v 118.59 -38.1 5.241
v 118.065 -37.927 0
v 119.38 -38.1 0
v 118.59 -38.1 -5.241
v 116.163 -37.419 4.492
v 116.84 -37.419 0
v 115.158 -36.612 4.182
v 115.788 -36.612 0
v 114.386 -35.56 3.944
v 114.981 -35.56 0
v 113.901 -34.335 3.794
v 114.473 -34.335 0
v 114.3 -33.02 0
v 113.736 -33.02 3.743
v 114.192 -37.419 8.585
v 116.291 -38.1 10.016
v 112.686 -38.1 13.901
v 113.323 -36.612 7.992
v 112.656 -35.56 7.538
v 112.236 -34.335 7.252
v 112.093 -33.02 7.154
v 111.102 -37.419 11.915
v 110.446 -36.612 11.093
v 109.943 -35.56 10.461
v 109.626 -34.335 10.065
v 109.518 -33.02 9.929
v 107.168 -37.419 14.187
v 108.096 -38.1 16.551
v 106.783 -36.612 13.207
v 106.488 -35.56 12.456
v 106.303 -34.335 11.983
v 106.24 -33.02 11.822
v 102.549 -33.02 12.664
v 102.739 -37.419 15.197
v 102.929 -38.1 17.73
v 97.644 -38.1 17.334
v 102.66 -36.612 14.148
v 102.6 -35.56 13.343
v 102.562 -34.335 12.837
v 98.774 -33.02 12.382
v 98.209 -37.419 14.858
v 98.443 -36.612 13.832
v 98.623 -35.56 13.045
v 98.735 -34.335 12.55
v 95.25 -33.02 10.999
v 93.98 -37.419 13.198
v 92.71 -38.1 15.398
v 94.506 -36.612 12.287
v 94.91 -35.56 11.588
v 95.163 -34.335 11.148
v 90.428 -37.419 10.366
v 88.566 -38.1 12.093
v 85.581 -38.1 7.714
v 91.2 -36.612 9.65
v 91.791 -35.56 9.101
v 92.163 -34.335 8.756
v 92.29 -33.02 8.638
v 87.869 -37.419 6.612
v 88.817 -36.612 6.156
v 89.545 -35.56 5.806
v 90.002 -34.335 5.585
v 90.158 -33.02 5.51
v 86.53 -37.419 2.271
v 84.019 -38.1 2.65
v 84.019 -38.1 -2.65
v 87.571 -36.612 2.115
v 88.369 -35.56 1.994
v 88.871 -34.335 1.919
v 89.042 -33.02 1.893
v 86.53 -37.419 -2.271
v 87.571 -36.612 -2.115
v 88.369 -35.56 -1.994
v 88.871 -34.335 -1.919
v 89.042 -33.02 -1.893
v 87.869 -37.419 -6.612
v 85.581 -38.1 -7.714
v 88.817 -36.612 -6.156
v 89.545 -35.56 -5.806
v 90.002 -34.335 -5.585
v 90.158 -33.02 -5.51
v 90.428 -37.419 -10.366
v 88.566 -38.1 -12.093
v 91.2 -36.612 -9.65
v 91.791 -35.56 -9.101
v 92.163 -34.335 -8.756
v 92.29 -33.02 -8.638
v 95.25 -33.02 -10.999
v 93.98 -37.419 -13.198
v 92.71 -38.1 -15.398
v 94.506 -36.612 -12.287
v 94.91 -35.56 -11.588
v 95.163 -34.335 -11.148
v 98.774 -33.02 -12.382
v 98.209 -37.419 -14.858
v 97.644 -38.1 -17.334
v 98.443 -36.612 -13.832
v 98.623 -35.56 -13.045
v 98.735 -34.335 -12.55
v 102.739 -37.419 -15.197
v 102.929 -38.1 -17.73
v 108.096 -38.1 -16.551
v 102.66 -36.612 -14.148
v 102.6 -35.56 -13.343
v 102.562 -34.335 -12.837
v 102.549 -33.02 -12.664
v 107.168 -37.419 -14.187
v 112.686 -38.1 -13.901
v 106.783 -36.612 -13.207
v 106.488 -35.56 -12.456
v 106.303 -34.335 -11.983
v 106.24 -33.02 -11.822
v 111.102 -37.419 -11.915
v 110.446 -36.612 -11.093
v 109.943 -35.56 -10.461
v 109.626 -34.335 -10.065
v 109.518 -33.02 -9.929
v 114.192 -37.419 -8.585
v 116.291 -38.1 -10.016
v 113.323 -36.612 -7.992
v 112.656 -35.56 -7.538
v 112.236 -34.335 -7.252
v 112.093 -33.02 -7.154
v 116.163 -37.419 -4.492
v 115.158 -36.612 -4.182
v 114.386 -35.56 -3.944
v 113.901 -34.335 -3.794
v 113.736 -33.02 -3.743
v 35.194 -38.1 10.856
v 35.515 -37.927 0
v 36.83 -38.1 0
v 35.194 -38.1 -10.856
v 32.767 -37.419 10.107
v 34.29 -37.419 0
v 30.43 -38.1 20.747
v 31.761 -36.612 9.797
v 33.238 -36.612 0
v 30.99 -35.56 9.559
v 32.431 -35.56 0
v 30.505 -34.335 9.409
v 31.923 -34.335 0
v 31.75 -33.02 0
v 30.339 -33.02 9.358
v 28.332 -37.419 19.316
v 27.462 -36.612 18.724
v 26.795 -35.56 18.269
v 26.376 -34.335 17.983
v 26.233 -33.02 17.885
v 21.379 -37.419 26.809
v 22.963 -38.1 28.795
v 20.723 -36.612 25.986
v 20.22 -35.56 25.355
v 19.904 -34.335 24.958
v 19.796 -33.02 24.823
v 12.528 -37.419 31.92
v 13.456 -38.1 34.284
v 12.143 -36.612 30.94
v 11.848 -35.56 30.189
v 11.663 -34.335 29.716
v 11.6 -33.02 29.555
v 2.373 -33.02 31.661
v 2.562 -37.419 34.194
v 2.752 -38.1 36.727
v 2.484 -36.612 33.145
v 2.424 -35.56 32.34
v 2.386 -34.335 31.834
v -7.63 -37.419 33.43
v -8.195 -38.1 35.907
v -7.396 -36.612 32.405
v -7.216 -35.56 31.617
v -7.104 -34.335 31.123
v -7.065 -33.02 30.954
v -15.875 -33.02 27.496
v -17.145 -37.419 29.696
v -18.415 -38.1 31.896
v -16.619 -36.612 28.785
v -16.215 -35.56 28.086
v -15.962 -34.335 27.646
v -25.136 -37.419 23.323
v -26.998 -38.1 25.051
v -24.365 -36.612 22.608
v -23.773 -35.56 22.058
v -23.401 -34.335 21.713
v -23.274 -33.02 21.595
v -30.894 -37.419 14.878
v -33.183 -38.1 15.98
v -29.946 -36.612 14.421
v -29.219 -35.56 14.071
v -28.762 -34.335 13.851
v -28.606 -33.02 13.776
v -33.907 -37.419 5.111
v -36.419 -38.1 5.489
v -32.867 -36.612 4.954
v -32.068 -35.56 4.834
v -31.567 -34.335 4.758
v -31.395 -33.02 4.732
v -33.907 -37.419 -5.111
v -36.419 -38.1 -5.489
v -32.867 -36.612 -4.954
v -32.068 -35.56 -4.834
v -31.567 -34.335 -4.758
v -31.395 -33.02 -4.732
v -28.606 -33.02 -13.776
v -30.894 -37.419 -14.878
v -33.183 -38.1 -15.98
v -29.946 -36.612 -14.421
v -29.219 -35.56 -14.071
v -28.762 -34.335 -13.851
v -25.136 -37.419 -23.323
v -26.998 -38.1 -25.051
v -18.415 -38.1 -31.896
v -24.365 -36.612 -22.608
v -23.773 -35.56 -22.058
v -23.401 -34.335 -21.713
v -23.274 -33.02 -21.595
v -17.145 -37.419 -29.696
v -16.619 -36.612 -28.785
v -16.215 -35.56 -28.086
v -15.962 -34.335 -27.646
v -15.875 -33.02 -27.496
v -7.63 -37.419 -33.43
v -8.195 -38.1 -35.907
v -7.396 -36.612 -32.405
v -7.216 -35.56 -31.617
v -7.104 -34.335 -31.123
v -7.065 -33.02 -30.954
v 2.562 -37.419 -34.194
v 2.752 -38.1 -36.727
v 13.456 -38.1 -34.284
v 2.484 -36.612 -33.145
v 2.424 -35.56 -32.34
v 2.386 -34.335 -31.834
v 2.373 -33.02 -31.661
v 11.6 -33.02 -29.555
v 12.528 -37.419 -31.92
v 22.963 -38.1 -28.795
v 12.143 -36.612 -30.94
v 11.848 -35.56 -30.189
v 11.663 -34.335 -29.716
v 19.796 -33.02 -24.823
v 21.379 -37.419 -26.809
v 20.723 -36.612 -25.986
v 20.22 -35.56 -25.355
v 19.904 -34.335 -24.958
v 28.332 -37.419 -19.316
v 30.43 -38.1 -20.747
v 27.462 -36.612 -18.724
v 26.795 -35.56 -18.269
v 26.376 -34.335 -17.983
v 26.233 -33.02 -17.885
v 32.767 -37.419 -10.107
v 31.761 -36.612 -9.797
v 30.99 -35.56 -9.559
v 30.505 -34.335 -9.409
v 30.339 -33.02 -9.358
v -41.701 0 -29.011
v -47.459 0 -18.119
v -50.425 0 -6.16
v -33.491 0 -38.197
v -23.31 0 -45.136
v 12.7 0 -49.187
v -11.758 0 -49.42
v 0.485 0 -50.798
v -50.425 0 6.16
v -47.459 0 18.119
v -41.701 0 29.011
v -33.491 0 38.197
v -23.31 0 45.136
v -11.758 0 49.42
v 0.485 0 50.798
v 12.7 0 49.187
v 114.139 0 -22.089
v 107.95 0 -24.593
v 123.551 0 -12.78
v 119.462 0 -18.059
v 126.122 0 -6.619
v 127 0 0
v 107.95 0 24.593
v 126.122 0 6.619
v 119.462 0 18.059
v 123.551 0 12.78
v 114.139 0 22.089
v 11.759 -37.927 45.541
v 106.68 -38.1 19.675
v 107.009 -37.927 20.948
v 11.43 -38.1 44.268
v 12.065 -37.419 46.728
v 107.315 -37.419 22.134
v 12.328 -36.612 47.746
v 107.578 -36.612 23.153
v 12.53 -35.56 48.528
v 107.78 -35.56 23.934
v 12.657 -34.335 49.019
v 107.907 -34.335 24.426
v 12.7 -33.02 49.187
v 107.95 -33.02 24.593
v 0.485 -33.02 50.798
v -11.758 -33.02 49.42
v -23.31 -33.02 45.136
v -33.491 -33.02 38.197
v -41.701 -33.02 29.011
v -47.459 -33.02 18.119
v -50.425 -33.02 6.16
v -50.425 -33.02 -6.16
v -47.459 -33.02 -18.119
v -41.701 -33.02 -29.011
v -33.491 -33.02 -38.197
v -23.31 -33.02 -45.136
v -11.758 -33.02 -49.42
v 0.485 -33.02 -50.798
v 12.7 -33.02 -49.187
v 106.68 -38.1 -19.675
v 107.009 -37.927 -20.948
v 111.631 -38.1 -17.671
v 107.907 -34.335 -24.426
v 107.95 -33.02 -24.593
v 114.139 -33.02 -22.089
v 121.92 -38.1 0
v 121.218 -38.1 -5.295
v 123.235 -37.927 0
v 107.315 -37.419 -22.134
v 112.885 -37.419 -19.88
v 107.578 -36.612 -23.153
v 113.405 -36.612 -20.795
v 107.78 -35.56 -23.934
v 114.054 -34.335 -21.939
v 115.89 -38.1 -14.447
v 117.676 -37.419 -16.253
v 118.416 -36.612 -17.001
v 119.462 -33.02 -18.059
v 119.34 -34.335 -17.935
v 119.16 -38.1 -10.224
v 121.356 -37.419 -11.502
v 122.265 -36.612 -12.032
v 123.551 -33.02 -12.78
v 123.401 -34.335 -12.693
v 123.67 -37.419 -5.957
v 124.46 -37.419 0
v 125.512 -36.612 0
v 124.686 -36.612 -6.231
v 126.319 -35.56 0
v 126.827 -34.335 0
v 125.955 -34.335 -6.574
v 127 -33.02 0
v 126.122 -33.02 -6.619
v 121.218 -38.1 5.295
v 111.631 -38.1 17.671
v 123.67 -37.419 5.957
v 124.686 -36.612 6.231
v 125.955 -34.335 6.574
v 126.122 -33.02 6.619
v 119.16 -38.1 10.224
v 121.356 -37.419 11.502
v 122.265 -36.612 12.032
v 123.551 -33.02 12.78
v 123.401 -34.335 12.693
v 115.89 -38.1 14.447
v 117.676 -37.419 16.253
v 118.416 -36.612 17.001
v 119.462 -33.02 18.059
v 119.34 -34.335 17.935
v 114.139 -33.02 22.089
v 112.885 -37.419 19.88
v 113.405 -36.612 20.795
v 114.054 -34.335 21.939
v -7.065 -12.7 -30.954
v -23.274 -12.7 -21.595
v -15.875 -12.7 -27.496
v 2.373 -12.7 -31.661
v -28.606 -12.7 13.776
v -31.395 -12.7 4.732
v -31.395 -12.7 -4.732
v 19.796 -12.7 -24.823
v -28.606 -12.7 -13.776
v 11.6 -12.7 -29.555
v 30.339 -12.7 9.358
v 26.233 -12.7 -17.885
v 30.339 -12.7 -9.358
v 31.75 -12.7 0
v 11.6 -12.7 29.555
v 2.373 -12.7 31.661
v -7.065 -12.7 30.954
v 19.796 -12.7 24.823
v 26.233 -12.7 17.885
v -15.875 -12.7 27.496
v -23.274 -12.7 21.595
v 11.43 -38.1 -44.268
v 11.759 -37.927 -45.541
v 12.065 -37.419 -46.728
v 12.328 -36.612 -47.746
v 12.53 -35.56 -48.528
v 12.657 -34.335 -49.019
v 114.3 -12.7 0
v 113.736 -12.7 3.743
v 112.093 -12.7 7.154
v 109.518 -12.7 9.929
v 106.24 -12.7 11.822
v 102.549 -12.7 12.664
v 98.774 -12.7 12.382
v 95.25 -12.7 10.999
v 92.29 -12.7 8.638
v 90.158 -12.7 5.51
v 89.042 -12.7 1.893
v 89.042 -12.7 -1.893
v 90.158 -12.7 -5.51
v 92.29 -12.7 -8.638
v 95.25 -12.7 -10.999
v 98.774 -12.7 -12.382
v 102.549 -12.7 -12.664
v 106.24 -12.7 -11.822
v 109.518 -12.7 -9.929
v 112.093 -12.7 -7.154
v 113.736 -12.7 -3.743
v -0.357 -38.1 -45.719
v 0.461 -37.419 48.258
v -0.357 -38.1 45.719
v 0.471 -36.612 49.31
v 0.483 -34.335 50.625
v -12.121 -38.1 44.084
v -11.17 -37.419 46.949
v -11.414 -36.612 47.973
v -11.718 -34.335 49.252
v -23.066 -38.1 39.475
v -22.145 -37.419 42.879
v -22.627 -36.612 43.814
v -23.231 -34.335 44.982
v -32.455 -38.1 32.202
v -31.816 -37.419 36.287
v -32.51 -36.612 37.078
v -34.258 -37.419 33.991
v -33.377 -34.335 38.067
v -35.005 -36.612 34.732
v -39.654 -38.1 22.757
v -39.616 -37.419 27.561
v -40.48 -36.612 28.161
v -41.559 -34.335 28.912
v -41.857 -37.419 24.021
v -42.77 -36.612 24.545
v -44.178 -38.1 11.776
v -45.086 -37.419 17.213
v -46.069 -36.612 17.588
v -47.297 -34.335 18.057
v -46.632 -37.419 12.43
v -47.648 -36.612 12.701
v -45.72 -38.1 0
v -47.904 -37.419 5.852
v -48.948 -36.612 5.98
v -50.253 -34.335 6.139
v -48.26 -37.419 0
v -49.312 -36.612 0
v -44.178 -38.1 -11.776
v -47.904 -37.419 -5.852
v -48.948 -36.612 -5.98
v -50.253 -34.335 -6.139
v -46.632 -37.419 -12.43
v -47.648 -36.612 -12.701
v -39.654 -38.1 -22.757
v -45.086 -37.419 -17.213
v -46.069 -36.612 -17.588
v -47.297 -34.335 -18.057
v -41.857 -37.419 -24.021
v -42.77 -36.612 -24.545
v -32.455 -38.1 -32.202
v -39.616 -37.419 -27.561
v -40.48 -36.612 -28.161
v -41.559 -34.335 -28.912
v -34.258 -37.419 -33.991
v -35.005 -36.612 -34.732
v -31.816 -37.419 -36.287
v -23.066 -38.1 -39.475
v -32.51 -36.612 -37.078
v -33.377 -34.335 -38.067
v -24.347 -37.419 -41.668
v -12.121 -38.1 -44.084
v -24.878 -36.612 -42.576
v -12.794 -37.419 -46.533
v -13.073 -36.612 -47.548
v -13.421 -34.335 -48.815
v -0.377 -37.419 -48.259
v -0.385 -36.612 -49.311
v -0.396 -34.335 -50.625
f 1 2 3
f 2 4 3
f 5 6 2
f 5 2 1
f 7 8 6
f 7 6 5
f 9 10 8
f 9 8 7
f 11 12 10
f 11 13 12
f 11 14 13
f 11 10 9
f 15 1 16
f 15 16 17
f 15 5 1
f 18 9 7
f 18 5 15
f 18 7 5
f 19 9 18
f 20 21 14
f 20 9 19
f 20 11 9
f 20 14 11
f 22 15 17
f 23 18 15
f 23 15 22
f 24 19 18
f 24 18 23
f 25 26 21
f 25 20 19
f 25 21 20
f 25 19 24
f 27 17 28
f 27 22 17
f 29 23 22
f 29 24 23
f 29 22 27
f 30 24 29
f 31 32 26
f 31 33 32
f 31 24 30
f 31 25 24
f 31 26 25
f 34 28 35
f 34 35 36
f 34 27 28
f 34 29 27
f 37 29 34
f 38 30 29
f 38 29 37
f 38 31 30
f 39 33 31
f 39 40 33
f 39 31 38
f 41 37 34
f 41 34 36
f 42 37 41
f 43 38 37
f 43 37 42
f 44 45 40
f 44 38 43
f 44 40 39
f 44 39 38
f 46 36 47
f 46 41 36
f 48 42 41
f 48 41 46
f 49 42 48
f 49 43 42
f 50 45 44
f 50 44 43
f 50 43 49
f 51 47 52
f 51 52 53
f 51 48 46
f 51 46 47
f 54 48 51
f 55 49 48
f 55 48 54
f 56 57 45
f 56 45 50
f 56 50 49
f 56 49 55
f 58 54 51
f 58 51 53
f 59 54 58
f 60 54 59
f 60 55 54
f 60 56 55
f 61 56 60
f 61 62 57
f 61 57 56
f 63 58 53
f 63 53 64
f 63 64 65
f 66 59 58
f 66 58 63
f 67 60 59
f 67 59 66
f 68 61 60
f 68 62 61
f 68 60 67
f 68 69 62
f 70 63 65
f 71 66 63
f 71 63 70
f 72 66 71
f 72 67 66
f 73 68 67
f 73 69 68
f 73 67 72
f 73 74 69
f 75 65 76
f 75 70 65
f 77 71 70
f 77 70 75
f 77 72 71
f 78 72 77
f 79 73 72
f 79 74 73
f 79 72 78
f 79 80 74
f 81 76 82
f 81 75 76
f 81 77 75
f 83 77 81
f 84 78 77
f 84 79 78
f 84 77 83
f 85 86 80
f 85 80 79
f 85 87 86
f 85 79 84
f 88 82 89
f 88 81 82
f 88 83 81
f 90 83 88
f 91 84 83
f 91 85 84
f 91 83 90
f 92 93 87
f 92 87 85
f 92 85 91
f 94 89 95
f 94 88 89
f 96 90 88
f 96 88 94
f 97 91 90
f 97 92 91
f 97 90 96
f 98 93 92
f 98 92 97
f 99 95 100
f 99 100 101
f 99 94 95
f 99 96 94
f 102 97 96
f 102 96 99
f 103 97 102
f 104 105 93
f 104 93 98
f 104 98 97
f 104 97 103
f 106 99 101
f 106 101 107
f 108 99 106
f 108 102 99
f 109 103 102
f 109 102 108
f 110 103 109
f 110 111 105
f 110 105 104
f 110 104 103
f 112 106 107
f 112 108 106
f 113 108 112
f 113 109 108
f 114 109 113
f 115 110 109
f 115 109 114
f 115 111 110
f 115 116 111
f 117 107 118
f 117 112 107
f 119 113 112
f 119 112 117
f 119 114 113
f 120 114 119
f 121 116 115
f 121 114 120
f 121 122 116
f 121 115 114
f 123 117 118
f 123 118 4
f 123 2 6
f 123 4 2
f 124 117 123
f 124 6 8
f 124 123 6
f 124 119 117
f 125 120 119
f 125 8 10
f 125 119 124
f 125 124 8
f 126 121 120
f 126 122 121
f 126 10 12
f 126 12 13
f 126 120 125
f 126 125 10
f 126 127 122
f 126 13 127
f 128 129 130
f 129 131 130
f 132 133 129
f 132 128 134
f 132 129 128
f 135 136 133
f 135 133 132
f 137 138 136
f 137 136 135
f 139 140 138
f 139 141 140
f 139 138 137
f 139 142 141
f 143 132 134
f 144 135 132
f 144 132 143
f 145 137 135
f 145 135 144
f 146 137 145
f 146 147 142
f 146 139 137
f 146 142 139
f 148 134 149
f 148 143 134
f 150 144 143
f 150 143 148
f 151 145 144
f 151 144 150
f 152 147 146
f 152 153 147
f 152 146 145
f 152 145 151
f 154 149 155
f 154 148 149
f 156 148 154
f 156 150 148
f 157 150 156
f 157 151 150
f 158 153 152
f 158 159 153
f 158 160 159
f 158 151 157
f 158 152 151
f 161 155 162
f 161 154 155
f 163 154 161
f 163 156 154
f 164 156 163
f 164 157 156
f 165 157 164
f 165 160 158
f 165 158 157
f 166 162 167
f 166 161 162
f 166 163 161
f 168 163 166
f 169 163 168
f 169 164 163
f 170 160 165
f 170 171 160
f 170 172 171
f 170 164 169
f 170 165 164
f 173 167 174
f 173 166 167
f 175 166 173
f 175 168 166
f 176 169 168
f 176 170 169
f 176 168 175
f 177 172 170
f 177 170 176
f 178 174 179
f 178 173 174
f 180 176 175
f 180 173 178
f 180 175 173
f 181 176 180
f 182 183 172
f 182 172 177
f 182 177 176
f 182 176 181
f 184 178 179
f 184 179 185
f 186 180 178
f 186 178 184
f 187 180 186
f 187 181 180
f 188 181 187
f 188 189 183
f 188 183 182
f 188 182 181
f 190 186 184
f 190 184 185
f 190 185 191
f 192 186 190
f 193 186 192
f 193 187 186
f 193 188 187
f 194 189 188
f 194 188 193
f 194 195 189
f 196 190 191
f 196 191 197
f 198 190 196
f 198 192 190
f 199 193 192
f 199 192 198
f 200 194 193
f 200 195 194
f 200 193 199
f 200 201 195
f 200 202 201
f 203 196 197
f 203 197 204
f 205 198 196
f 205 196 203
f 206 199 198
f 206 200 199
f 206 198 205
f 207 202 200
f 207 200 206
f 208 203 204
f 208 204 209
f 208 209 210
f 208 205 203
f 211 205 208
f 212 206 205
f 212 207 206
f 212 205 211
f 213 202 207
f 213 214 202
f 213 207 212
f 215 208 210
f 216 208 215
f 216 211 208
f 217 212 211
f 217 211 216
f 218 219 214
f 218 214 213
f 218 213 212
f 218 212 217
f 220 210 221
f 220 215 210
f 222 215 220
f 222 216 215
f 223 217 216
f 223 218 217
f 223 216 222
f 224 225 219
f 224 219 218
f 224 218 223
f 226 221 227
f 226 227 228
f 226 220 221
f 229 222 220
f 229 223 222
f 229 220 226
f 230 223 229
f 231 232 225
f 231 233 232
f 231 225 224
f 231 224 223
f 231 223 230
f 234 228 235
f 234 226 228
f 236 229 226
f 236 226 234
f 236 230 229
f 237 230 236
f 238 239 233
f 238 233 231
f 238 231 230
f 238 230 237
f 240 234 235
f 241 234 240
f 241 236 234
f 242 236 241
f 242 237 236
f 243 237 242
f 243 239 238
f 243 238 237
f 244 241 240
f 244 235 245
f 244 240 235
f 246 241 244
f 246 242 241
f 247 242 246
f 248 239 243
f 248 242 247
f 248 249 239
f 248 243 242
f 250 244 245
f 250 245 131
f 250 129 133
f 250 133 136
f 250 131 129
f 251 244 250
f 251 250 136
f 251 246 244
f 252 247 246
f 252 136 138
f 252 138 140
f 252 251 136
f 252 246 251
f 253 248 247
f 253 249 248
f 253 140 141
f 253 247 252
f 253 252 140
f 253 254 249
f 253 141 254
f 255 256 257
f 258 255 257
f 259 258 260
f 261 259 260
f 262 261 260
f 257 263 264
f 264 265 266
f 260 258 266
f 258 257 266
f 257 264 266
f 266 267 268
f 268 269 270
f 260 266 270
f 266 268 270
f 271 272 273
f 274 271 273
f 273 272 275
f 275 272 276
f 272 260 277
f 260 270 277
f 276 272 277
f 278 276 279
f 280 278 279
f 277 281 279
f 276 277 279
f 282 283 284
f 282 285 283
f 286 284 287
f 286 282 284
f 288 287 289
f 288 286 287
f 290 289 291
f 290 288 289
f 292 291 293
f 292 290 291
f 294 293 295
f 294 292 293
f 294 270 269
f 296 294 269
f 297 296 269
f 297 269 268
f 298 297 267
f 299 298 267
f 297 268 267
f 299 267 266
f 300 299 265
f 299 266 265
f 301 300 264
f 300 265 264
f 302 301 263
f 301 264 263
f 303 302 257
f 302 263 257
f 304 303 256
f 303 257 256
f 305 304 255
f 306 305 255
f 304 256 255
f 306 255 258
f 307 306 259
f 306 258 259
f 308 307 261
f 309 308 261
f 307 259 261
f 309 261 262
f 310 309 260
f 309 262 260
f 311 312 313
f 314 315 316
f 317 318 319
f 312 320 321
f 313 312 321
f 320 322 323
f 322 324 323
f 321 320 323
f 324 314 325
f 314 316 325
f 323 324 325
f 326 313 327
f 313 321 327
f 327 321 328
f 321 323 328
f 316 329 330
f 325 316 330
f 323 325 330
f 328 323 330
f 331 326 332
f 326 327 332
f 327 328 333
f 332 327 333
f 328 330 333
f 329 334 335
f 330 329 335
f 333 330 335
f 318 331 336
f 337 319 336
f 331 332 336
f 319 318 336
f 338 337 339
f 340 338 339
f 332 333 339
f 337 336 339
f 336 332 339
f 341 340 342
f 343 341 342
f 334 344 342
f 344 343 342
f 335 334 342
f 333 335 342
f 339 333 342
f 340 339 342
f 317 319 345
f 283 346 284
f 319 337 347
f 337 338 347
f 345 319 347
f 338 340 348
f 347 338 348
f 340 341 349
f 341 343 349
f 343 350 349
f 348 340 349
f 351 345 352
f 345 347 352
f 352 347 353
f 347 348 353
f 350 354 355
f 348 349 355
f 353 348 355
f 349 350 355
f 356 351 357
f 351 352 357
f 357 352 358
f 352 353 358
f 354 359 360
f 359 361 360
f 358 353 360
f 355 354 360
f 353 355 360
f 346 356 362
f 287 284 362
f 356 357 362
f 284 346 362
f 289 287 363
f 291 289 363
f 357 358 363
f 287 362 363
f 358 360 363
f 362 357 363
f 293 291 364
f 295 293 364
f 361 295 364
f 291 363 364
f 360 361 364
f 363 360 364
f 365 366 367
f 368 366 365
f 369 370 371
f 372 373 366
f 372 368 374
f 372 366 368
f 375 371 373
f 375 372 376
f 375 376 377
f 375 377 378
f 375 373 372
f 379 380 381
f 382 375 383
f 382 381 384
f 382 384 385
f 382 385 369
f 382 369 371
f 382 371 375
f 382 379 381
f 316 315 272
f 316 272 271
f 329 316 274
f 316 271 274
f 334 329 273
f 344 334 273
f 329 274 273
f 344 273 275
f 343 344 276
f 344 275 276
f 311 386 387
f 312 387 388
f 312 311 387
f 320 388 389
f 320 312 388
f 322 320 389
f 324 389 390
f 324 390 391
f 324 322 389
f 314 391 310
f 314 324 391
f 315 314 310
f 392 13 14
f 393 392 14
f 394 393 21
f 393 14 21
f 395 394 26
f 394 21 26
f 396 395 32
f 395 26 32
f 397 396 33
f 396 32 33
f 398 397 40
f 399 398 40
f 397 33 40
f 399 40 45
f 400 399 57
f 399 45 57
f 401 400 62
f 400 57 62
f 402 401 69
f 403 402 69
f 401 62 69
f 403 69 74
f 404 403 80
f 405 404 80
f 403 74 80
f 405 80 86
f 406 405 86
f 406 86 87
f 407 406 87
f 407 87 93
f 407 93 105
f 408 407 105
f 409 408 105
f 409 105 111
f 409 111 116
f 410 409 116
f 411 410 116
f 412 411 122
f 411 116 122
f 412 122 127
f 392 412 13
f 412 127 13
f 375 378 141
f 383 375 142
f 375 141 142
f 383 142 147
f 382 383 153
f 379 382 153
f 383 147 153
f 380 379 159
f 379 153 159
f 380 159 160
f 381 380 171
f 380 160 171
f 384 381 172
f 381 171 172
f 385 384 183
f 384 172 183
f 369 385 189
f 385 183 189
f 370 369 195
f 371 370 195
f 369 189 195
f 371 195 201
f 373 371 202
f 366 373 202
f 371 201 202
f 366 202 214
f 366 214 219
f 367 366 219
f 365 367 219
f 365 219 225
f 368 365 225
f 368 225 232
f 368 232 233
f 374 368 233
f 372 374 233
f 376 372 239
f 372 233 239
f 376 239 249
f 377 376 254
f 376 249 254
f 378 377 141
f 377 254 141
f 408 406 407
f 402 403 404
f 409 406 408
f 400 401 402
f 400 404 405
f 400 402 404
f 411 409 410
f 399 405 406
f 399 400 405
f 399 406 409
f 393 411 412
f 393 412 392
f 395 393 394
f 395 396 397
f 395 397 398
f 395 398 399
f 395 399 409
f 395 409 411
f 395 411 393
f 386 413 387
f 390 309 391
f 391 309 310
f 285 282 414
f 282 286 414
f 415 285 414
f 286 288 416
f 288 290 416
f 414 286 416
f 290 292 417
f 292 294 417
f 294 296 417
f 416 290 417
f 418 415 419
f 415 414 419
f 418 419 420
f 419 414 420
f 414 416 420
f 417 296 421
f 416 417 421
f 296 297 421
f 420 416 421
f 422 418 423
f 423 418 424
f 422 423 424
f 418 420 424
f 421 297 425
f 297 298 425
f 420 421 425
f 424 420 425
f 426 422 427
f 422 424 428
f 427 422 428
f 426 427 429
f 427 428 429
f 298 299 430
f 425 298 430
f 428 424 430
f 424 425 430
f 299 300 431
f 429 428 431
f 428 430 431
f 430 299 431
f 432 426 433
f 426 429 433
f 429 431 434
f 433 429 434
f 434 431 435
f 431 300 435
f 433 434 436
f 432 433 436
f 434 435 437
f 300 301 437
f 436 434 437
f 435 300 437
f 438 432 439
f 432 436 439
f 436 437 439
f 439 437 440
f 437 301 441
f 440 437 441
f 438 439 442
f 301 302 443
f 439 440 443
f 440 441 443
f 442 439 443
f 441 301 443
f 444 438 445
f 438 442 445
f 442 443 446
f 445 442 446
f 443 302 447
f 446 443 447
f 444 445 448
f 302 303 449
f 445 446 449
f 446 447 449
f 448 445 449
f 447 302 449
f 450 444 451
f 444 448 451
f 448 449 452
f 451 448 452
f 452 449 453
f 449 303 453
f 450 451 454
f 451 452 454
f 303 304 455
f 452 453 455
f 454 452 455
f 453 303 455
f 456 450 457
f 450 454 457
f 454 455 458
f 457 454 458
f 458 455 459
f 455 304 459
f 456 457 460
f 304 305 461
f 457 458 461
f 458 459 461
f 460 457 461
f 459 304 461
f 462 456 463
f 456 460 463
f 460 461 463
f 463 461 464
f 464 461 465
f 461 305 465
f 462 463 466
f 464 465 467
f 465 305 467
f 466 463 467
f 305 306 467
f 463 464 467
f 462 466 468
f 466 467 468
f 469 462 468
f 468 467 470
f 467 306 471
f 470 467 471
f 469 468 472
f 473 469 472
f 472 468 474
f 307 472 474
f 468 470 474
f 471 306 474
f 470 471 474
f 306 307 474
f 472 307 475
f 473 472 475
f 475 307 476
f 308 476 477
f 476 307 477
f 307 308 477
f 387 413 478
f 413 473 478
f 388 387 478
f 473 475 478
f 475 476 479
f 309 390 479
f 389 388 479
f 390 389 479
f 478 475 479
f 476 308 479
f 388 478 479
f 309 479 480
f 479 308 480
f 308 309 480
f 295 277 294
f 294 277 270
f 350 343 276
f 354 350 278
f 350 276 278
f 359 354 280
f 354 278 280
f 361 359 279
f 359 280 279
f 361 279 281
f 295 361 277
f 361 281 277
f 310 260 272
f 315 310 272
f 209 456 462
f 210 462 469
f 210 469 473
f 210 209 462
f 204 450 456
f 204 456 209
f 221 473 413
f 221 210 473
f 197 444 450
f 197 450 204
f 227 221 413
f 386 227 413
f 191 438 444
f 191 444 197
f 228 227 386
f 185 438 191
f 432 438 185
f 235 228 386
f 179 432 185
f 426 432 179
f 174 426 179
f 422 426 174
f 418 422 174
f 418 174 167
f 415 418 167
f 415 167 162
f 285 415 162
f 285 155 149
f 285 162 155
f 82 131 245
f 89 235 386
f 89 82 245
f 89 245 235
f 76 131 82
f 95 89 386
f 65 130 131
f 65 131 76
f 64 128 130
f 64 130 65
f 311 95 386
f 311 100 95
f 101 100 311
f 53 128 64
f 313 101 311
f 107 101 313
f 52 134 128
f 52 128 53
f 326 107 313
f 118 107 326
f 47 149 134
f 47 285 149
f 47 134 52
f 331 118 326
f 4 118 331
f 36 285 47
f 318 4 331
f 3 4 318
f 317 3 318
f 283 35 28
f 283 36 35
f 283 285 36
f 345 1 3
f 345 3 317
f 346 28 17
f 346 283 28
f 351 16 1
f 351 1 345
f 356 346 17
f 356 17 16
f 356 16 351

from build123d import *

# Parameters (mm, degrees)
F0_DEPTH = 38.1
F1_R     = 31.75
F1_R_2   = 12.7
F4_DEPTH = 25.4
F2_R     = 5.08


with BuildPart() as f0:
    # F3 (on Front) → F0 (new body)
    with BuildSketch(Plane.XZ):
        with BuildLine():
            ThreePointArc((12.7, 49.186888), (40.160926, 31.10852), (50.8, 0))
            ThreePointArc((50.8, 0), (40.160926, -31.10852), (12.7, -49.186888))
            Line((12.7, -49.186888), (107.95, -24.593444))
            ThreePointArc((107.95, -24.593444), (76.2, 0), (107.95, 24.593444))
            Line((107.95, 24.593444), (12.7, 49.186888))
        make_face()
        with BuildLine():
            ThreePointArc((12.7, -49.186888), (40.160926, -31.10852), (50.8, 0))
            ThreePointArc((50.8, 0), (40.160926, 31.10852), (12.7, 49.186888))
            ThreePointArc((12.7, 49.186888), (-50.8, 0), (12.7, -49.186888))
        make_face()
        with BuildLine():
            ThreePointArc((127, 0), (121.680463, 15.55426), (107.95, 24.593444))
            ThreePointArc((107.95, 24.593444), (76.2, 0), (107.95, -24.593444))
            ThreePointArc((107.95, -24.593444), (121.680463, -15.55426), (127, 0))
        make_face()
    extrude(amount=F0_DEPTH)

    # F1 (on face) → F4 (cut)
    with BuildSketch(Plane.XZ.offset(38.1)):
        Circle(F1_R)
        with Locations((101.6, 0)):
            Circle(F1_R_2)
    extrude(amount=-F4_DEPTH, mode=Mode.SUBTRACT)

    # F2
    f2_edges = [f0.edges().sort_by_distance(p)[0] for p in [
        (-31.75, -38.1, 0),
        (88.9, -38.1, 0),
        (60.325, -38.1, 36.890166),
    ]]
    fillet(f2_edges, radius=F2_R)


solid = f0.part
